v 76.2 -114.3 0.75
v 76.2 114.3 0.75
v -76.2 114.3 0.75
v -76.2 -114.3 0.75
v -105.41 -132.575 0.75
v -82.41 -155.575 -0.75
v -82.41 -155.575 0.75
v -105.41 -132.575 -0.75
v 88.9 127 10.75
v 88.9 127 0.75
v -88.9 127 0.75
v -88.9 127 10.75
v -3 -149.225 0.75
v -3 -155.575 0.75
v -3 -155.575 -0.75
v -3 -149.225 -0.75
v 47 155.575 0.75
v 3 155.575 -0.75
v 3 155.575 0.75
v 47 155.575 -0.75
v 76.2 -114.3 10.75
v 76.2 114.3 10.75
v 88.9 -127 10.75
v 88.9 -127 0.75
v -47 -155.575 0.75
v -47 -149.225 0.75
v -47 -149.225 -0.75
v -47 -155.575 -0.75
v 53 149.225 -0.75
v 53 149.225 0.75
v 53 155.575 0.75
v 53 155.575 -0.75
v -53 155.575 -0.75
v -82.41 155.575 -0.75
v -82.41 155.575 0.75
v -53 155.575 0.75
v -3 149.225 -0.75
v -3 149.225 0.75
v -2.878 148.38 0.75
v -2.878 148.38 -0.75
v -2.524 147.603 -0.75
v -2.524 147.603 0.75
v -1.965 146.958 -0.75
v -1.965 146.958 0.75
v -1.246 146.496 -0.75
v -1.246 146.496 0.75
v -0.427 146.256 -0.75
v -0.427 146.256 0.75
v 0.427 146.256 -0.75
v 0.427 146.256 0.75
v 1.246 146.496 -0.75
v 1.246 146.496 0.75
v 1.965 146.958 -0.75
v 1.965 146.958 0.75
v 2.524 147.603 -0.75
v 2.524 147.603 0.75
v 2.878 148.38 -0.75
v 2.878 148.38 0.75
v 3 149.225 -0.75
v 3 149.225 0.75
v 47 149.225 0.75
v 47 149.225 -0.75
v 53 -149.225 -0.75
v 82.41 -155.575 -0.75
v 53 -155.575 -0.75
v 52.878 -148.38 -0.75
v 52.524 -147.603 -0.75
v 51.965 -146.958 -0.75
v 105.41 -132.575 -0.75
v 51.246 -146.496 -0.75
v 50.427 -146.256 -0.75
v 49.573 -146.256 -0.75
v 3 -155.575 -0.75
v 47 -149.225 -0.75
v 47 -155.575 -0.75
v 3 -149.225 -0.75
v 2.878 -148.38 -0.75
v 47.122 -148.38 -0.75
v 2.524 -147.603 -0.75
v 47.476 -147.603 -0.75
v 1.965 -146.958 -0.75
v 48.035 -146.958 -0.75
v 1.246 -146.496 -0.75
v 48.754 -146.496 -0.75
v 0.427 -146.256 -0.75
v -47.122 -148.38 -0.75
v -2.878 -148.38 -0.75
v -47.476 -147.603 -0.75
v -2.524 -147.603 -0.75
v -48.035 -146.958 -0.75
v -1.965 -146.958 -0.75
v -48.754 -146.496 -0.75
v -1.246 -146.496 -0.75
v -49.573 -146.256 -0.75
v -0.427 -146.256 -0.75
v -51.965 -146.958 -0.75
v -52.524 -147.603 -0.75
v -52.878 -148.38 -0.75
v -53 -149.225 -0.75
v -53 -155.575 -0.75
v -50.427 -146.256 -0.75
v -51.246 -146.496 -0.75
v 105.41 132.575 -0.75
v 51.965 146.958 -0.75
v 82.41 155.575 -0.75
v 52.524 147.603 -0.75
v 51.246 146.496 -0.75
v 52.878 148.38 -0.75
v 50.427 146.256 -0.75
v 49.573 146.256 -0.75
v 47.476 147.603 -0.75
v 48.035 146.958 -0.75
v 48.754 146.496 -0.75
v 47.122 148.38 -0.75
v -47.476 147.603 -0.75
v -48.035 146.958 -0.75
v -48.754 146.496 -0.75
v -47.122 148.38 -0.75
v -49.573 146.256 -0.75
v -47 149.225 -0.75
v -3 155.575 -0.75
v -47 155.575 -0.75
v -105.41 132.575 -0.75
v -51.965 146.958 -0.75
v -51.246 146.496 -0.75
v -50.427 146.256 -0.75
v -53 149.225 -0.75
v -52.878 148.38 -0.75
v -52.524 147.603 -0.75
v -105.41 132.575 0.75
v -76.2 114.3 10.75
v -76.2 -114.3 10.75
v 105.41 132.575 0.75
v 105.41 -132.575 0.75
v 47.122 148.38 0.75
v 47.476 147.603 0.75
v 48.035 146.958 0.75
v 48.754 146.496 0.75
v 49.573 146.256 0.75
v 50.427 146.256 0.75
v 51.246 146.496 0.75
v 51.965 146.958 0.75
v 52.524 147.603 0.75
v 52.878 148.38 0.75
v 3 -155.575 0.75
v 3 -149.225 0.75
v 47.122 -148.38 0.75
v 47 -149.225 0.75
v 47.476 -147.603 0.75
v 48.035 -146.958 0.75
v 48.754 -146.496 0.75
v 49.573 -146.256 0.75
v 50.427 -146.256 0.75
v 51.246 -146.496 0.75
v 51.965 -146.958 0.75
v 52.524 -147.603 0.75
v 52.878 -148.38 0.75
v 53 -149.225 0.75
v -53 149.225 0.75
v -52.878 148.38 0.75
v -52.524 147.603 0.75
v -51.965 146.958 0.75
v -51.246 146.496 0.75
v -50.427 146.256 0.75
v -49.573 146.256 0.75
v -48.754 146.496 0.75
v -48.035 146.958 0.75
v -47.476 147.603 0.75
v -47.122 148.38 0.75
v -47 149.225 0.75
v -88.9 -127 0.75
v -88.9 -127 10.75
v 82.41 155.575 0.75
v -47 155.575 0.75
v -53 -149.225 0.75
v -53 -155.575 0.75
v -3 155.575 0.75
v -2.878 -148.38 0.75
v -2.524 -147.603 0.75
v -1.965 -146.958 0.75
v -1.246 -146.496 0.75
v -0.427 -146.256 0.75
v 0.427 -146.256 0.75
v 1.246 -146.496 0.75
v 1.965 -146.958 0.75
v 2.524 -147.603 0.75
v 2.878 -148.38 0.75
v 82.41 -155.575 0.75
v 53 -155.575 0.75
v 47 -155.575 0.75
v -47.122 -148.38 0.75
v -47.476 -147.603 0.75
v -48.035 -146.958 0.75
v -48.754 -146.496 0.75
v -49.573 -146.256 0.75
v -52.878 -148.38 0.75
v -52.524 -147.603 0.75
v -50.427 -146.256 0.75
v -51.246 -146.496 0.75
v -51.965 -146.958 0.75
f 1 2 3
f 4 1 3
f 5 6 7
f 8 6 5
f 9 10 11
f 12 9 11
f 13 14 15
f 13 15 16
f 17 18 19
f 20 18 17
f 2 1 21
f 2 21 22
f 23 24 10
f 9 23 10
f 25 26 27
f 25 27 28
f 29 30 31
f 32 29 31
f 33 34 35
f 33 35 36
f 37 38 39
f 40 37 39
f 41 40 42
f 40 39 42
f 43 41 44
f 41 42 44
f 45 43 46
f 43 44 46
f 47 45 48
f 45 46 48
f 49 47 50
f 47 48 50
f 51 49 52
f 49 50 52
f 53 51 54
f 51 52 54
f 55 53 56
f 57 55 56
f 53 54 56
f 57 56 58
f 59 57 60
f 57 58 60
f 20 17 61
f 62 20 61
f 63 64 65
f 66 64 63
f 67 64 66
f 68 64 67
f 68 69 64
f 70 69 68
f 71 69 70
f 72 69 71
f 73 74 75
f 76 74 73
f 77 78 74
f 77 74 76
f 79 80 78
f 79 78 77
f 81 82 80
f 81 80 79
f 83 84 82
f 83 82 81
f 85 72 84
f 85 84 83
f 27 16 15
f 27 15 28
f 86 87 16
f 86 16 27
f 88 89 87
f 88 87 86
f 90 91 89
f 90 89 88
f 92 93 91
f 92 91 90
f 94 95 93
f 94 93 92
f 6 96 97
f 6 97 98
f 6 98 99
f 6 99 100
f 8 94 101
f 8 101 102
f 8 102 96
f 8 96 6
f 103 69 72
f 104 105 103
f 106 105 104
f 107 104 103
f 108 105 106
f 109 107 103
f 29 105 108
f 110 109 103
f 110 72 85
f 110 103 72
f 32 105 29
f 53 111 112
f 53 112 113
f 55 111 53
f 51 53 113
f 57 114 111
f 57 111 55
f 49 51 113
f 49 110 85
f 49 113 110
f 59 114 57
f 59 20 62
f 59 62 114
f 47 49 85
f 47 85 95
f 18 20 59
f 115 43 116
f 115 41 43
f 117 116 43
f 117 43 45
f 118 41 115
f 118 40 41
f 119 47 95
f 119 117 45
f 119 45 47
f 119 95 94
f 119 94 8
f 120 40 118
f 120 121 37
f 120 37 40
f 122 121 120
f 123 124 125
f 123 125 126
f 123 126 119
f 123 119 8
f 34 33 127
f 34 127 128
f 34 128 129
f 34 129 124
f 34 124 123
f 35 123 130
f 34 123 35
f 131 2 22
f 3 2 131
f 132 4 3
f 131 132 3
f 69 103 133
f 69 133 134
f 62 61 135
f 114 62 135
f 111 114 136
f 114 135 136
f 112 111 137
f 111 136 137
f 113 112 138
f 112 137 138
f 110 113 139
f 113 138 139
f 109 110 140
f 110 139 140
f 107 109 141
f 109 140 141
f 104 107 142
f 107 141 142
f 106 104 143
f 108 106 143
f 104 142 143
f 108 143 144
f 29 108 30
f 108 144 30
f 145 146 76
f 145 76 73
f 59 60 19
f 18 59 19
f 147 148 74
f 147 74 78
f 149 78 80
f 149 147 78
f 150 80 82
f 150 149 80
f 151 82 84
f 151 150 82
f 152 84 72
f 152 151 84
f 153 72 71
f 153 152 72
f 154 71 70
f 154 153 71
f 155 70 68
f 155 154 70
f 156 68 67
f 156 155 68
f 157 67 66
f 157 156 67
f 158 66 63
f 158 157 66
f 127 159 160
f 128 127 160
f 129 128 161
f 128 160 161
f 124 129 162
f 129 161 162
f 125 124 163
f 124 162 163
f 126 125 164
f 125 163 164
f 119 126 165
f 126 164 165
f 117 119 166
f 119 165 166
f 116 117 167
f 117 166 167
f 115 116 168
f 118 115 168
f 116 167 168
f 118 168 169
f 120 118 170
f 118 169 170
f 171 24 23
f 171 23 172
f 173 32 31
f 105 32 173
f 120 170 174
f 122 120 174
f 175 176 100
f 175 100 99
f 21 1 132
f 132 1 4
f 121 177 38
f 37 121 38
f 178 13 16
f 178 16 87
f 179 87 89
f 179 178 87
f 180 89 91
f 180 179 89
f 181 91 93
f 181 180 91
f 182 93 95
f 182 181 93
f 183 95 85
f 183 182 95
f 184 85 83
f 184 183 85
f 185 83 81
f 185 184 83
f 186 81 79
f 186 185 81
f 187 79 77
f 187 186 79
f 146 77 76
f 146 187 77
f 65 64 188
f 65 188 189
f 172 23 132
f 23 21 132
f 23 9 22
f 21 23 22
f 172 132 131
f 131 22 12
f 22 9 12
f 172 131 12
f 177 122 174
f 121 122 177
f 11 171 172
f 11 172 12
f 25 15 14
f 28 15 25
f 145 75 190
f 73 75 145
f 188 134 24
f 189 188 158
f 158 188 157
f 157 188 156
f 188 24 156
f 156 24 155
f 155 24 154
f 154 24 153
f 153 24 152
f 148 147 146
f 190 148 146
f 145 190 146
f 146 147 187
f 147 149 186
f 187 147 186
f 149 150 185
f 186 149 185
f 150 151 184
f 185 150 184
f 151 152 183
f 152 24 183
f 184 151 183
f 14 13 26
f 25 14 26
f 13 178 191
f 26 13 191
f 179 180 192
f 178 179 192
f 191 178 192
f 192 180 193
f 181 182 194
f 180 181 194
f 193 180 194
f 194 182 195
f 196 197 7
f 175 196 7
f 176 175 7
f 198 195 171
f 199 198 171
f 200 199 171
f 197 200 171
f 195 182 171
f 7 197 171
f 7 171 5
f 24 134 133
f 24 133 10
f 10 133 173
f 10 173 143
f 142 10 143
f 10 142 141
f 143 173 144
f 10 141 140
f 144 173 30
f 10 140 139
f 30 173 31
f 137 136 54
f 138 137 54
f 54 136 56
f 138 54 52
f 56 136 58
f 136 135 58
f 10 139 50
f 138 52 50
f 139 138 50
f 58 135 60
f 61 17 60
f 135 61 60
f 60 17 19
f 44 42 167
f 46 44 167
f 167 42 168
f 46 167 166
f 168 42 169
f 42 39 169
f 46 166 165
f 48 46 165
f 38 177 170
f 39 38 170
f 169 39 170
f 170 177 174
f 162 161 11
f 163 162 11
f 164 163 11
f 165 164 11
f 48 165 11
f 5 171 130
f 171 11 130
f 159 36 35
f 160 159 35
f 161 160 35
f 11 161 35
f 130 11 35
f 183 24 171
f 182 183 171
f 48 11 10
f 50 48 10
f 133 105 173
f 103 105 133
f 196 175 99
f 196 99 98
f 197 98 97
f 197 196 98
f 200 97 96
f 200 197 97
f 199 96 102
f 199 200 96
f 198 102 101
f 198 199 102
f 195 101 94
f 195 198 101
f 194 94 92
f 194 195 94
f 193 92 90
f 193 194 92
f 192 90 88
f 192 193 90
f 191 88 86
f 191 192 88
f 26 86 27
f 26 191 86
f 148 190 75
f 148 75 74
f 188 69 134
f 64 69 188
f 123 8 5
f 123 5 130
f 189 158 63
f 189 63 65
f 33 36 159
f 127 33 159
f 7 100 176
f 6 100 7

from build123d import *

# Parameters (mm, degrees)
BOSS_EXTRUDE1_DEPTH      = 0.75
BOSS_EXTRUDE1_DEPTH_BACK = 0.75
CUT_EXTRUDE1_DEPTH       = 188.923950642
LPATTERN1_COUNT          = 7
LPATTERN1_PITCH          = 50
MIRROR1_COPY_1_DEPTH     = 188.923950642
MIRROR1_COPY_2_DEPTH     = 188.923950642
MIRROR1_COPY_3_DEPTH     = 188.923950642
MIRROR1_COPY_4_DEPTH     = 188.923950642
MIRROR1_COPY_5_DEPTH     = 188.923950642
MIRROR1_COPY_6_DEPTH     = 188.923950642
SKETCH6_W                = 177.8
SKETCH6_H                = 254
SKETCH6_W_2              = 152.4
SKETCH6_H_2              = 228.6
BOSS_EXTRUDE2_DEPTH      = 11.5


with BuildPart() as part:
    # Sketch3 → Boss-Extrude1 (new, two sides: drawn at the far end of the back side and taken through both)
    with BuildSketch(Plane.XY.offset(-BOSS_EXTRUDE1_DEPTH_BACK)):
        Polygon((-105.41, 132.575), (-82.41, 155.575), (82.41, 155.575), (105.41, 132.575), (105.41, -132.575), (82.41, -155.575), (-82.41, -155.575), (-105.41, -132.575), align=None)
    extrude(amount=BOSS_EXTRUDE1_DEPTH + BOSS_EXTRUDE1_DEPTH_BACK)

    # Sketch4 → Cut-Extrude1 (cut, symmetric)
    with BuildSketch(Plane.XY):
        with BuildLine():
            Line((53, 149.225), (53, 155.575))
            Line((53, 155.575), (47, 155.575))
            Line((47, 155.575), (47, 149.225))
            ThreePointArc((47, 149.225), (50, 146.225), (53, 149.225))
        make_face()
    cut_extrude1 = extrude(amount=CUT_EXTRUDE1_DEPTH, both=True, mode=Mode.SUBTRACT)

    # LPattern1: Cut-Extrude1 ×7
    with Locations(*[(-i * LPATTERN1_PITCH, 0, 0) for i in range(1, LPATTERN1_COUNT)]):
        add(cut_extrude1, mode=Mode.SUBTRACT)

    # Mirror1: Cut-Extrude1 across plane
    add(cut_extrude1.mirror(Plane.ZX), mode=Mode.SUBTRACT)

    # Mirror1 copy 1 sketch → Mirror1 copy 1 (cut, symmetric)
    with BuildSketch(Plane(origin=(-50, 0, 0), x_dir=(1, 0, 0), z_dir=(0, 0, 1))):
        with BuildLine():
            Line((53, -149.225), (53, -155.575))
            Line((53, -155.575), (47, -155.575))
            Line((47, -155.575), (47, -149.225))
            ThreePointArc((47, -149.225), (50, -146.225), (53, -149.225))
        make_face()
    extrude(amount=MIRROR1_COPY_1_DEPTH, both=True, mode=Mode.SUBTRACT)

    # Mirror1 copy 2 sketch → Mirror1 copy 2 (cut, symmetric)
    with BuildSketch(Plane(origin=(-100, 0, 0), x_dir=(1, 0, 0), z_dir=(0, 0, 1))):
        with BuildLine():
            Line((53, -149.225), (53, -155.575))
            Line((53, -155.575), (47, -155.575))
            Line((47, -155.575), (47, -149.225))
            ThreePointArc((47, -149.225), (50, -146.225), (53, -149.225))
        make_face()
    extrude(amount=MIRROR1_COPY_2_DEPTH, both=True, mode=Mode.SUBTRACT)

    # Mirror1 copy 3 sketch → Mirror1 copy 3 (cut, symmetric)
    with BuildSketch(Plane(origin=(-150, 0, 0), x_dir=(1, 0, 0), z_dir=(0, 0, 1))):
        with BuildLine():
            Line((53, -149.225), (53, -155.575))
            Line((53, -155.575), (47, -155.575))
            Line((47, -155.575), (47, -149.225))
            ThreePointArc((47, -149.225), (50, -146.225), (53, -149.225))
        make_face()
    extrude(amount=MIRROR1_COPY_3_DEPTH, both=True, mode=Mode.SUBTRACT)

    # Mirror1 copy 4 sketch → Mirror1 copy 4 (cut, symmetric)
    with BuildSketch(Plane(origin=(-200, 0, 0), x_dir=(1, 0, 0), z_dir=(0, 0, 1))):
        with BuildLine():
            Line((53, -149.225), (53, -155.575))
            Line((53, -155.575), (47, -155.575))
            Line((47, -155.575), (47, -149.225))
            ThreePointArc((47, -149.225), (50, -146.225), (53, -149.225))
        make_face()
    extrude(amount=MIRROR1_COPY_4_DEPTH, both=True, mode=Mode.SUBTRACT)

    # Mirror1 copy 5 sketch → Mirror1 copy 5 (cut, symmetric)
    with BuildSketch(Plane(origin=(-250, 0, 0), x_dir=(1, 0, 0), z_dir=(0, 0, 1))):
        with BuildLine():
            Line((53, -149.225), (53, -155.575))
            Line((53, -155.575), (47, -155.575))
            Line((47, -155.575), (47, -149.225))
            ThreePointArc((47, -149.225), (50, -146.225), (53, -149.225))
        make_face()
    extrude(amount=MIRROR1_COPY_5_DEPTH, both=True, mode=Mode.SUBTRACT)

    # Mirror1 copy 6 sketch → Mirror1 copy 6 (cut, symmetric)
    with BuildSketch(Plane(origin=(-300, 0, 0), x_dir=(1, 0, 0), z_dir=(0, 0, 1))):
        with BuildLine():
            Line((53, -149.225), (53, -155.575))
            Line((53, -155.575), (47, -155.575))
            Line((47, -155.575), (47, -149.225))
            ThreePointArc((47, -149.225), (50, -146.225), (53, -149.225))
        make_face()
    extrude(amount=MIRROR1_COPY_6_DEPTH, both=True, mode=Mode.SUBTRACT)

    # Sketch6 → Boss-Extrude2 (add)
    with BuildSketch(Plane(origin=(0, 0, -0.75), x_dir=(-1, 0, 0), z_dir=(0, 0, -1))):
        Rectangle(SKETCH6_W, SKETCH6_H)
        Rectangle(SKETCH6_W_2, SKETCH6_H_2, mode=Mode.SUBTRACT)
    extrude(amount=-BOSS_EXTRUDE2_DEPTH)


solid = part.part
